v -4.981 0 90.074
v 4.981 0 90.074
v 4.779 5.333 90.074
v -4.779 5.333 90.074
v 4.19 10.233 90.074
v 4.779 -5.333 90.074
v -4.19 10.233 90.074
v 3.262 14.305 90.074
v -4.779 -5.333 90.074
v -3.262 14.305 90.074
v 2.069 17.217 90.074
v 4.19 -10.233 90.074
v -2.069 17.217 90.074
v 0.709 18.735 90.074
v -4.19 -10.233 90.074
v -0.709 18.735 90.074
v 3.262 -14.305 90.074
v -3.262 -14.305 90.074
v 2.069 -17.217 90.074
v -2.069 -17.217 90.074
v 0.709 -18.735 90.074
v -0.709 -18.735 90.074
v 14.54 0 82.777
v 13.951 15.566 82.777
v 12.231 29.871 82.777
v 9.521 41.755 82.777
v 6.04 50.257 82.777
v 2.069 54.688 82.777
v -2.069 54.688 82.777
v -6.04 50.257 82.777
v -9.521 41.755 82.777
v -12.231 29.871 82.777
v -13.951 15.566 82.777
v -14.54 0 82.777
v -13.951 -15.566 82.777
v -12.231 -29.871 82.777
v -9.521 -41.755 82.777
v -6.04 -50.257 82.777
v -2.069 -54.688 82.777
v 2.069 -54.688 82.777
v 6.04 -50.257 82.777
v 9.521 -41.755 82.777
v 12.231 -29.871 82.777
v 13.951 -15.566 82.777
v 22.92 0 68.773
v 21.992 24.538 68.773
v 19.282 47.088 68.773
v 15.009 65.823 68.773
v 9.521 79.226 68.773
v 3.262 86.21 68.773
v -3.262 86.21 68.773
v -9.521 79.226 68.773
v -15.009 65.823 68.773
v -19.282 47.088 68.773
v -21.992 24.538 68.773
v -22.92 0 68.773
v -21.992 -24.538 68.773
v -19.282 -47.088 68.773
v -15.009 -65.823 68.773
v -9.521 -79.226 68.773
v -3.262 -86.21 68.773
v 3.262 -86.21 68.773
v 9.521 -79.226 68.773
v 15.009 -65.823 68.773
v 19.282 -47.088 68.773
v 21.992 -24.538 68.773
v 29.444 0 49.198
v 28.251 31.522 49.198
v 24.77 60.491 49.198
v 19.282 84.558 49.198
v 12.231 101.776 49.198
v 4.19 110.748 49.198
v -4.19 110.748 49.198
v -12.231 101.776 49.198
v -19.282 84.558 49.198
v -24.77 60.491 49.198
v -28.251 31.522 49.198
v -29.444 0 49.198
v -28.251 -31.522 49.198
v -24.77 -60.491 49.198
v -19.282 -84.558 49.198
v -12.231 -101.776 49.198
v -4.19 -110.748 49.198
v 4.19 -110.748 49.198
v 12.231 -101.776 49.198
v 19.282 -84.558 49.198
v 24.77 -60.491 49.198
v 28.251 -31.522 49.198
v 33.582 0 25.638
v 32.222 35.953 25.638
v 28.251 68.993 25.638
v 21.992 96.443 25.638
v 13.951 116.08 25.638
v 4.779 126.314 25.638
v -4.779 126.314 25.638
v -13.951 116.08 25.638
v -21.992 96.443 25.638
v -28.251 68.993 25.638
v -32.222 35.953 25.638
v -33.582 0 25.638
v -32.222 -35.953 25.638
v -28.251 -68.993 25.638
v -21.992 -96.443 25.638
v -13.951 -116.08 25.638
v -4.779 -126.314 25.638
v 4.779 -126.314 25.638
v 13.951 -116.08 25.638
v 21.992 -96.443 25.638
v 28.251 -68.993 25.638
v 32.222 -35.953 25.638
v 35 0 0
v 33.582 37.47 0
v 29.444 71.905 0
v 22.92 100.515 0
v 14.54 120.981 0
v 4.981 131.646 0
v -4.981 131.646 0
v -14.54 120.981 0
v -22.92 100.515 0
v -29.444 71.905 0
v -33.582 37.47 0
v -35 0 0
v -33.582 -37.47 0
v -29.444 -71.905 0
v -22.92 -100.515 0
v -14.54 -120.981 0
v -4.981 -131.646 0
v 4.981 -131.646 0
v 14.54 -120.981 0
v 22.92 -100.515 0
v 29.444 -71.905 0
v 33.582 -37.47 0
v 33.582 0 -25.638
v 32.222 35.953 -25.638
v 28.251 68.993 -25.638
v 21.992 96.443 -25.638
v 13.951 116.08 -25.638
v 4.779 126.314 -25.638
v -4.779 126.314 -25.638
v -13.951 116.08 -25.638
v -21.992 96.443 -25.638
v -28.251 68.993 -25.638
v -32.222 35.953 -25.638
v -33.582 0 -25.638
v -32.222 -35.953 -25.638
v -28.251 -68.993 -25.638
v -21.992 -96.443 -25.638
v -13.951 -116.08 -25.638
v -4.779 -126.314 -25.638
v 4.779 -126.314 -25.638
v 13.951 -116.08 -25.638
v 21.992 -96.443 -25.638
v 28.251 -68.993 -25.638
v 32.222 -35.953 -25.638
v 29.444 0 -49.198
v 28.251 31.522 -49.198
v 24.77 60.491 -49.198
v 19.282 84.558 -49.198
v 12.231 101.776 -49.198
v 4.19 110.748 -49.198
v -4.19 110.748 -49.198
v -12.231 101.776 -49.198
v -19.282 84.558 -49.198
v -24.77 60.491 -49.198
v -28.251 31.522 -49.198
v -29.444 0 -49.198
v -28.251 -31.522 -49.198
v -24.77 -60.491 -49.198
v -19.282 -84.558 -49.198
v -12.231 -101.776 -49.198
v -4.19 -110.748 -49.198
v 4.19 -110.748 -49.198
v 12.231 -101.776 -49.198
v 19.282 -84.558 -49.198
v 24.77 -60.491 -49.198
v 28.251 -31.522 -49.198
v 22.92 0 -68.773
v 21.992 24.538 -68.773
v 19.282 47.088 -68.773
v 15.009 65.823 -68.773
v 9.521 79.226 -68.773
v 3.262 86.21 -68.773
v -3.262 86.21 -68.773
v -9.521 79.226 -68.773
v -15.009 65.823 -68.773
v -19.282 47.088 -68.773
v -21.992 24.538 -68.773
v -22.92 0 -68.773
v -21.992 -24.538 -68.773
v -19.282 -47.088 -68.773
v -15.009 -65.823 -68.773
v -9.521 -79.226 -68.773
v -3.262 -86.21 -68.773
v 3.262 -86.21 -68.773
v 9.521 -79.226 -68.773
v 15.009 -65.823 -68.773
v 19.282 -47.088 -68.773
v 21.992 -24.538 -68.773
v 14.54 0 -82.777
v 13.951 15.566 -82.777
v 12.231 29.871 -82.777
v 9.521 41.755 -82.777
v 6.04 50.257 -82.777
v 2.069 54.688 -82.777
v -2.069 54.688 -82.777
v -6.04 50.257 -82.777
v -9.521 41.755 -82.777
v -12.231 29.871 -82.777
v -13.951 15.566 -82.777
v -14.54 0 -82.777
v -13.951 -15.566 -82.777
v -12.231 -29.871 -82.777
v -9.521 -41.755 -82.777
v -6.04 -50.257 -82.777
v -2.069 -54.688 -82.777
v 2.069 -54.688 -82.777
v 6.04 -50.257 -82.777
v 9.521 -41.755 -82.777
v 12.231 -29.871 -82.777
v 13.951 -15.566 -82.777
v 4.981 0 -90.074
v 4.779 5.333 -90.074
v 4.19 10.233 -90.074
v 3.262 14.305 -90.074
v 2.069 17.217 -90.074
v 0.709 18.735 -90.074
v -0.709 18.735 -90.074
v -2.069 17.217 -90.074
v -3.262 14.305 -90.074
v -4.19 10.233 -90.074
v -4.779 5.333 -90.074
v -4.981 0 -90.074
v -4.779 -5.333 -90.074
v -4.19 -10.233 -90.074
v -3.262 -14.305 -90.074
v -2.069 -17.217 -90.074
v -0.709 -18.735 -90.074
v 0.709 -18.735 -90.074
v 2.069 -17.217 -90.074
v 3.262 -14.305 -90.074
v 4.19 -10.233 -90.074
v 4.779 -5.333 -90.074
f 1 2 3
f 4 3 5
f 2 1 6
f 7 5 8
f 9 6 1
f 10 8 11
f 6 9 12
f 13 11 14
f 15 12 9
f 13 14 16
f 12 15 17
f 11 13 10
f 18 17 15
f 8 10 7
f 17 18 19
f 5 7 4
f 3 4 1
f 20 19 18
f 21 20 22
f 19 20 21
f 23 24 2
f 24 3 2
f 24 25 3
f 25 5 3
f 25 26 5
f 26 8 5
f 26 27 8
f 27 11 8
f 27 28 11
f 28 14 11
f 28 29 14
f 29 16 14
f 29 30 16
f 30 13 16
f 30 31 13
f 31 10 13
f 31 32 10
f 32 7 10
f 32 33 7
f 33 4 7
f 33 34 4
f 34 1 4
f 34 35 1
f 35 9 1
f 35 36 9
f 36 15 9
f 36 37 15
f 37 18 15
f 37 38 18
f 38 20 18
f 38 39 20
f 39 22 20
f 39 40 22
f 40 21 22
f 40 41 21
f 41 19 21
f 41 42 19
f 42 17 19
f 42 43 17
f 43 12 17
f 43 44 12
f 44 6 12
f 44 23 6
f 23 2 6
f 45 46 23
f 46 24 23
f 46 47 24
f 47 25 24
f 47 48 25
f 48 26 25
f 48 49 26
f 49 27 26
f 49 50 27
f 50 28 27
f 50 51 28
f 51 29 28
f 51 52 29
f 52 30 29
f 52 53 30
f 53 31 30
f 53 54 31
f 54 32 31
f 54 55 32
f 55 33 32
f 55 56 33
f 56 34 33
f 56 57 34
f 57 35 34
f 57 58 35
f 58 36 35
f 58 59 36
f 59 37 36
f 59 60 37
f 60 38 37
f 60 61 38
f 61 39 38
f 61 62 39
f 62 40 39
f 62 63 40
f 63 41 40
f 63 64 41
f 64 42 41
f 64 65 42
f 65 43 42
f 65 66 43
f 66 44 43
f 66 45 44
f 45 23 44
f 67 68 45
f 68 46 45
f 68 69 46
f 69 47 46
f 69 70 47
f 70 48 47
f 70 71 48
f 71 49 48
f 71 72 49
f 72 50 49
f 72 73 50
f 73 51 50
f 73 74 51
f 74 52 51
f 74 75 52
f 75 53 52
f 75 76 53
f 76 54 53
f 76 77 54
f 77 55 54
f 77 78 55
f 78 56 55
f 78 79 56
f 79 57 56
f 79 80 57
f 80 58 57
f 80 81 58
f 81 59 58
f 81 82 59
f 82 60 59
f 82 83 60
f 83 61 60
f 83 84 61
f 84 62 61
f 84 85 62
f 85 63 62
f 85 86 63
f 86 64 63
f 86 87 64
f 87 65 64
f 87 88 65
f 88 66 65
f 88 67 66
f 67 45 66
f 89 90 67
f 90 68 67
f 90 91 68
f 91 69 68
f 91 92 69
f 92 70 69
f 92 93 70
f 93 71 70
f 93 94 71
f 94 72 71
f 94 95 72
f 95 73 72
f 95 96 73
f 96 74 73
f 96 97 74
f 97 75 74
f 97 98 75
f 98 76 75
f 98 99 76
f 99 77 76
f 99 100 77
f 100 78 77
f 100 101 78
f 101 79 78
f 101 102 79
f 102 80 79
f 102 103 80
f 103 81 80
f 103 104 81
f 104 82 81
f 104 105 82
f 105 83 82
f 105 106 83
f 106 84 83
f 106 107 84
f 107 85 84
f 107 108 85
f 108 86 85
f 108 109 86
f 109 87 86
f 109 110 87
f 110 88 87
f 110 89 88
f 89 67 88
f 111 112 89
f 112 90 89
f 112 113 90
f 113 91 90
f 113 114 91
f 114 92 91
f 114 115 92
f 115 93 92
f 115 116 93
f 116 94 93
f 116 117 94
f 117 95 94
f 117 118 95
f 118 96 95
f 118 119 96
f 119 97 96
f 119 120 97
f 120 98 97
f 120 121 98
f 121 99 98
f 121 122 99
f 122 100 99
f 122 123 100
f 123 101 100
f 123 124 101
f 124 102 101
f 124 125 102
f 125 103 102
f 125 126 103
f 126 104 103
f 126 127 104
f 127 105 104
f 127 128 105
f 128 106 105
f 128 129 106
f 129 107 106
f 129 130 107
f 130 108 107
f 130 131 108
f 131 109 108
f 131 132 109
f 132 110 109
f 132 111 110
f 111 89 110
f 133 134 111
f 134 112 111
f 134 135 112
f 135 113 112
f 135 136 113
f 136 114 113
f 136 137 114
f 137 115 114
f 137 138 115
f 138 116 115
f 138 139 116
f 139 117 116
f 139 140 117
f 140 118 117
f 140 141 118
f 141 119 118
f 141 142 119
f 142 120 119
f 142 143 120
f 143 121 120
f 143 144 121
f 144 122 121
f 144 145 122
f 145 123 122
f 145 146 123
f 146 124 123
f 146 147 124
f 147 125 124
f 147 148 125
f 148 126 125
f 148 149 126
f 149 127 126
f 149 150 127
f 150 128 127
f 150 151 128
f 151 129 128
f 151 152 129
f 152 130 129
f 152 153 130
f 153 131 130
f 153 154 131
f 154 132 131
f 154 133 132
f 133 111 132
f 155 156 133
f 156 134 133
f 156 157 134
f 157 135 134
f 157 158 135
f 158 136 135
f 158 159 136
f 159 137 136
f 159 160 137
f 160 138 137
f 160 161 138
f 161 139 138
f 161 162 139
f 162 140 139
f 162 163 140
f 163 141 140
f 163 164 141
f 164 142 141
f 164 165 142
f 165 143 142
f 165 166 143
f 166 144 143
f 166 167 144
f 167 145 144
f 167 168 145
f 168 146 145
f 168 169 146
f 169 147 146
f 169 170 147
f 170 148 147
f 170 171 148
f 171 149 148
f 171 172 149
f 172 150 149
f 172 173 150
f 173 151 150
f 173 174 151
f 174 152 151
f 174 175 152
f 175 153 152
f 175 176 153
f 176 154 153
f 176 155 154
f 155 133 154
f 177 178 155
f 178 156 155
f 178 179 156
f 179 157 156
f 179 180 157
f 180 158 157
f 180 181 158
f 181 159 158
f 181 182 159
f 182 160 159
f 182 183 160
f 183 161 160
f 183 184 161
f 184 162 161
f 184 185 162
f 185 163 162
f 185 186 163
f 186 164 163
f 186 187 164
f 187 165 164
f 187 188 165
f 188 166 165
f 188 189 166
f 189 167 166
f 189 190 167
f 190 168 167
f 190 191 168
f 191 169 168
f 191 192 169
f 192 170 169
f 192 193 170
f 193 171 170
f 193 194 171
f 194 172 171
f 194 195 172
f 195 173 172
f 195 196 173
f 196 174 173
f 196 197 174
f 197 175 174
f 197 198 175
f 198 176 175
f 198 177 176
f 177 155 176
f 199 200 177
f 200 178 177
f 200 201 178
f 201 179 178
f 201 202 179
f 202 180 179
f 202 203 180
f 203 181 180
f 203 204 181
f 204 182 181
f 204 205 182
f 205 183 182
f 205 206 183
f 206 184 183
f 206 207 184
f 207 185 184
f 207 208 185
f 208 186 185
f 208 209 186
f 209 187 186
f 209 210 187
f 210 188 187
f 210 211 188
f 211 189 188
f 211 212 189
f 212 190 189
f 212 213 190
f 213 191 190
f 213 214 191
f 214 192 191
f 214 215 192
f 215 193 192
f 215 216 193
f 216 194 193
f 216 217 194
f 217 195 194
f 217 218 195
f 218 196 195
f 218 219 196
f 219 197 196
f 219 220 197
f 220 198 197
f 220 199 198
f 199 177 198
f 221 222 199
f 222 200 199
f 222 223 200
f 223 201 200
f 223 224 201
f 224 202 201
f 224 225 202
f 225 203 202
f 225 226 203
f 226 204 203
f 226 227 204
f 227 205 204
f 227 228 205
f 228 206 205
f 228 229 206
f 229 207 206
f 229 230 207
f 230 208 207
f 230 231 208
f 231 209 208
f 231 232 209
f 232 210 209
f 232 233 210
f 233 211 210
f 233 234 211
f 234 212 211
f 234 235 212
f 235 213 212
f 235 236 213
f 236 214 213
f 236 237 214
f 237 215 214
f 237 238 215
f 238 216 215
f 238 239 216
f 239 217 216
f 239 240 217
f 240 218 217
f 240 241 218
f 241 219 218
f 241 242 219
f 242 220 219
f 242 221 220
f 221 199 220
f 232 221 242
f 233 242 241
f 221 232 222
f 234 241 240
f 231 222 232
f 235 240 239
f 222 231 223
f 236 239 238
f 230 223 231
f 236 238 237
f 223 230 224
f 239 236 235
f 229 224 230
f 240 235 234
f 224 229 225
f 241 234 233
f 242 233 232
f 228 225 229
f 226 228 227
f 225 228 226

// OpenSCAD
// Generated by SolidPython 1.0.1 on 2020-07-29 00:46:47


scale(v = [5, 19, 13]) {
	sphere(r = 7);
}
/***********************************************
*********      SolidPython code:      **********
************************************************
 
# import packages: SolidPython
from solid import *
from solid.utils import *
from itertools import chain, combinations, permutations


class Resize:

    def __init__(self, scad_file):
        self.scad_file = scad_file
        #self.scad_file = import_scad(scad_file)
        # cone/cylinder param:
        self.r1 = 0
        self.r2 = 0
        self.h = 0
        # rectangular prism param:
        self.w = 0
        self.l = 0
        # ellipse param:
        self.r = 0

    # import OpenScad code (file name corresponds to shape)


    # classify shape + parameters
    def assign(self, param1, param2, param3):
        if self.scad_file == 'cone.scad':
            self.r1 = param1
            self.r2 = param2
            self.h = param3
        elif self.scad_file == 'cylinder.scad':
            self.r1 = param1
            self.r2 = param2
            self.h = param3
        elif self.scad_file == 'rectangularPrism.scad':
            self.h = param1
            self.l = param2
            self.w = param3
        else:
            self.r = param1
            self.h = param2

    # resize parameters
    def iterate(self):
        x = range(3, 20, 2)
        i = 1
        if self.scad_file == 'cone.scad':
            tempList = list(permutations(x, 2))
            for temp in tempList:
                param1 = temp[0]
                param2 = temp[1]
                filepath = 'produced_scad_files/' + 'cone' + str(param1) + '_' + str(param2) + '_' + '.scad'
                scad_render_to_file(cylinder(h=param1, r1=param2, r2=0), filepath)

        elif self.scad_file == 'cylinder.scad':
            tempList = list(permutations(x, 3))
            for temp in tempList:
                param1 = temp[0]
                param2 = temp[1]
                filepath = 'produced_scad_files/' + 'cylinder' + str(param1) + '_' + str(param2) + '_' + '.scad'
                scad_render_to_file(cylinder(h=param1, r1=param2, r2=param2), filepath)

        elif self.scad_file == 'rectangularPrism.scad':
            tempList = list(permutations(x, 3))
            for temp in tempList:
                param1 = temp[0]
                param2 = temp[1]
                param3 = temp[2]
                filepath = 'produced_scad_files/' + 'rectangularPrism' + str(param1) + '_' + str(param2) + '_' + str(
                    param3) + '.scad'
                scad_render_to_file(cube(size=(param1, param2, param3)), filepath)

        elif self.scad_file == 'ellipse.scad':
            tempList = list(permutations(x, 4))
            for temp in tempList:
                param1 = temp[0]
                param2 = temp[1]
                param3 = temp[2]
                param4 = temp[3]
                filepath = 'produced_scad_files/' + 'ellipse' + str(param1) + '_' + str(param2) + '_' + str(param3) + '_' + str(param4) + '.scad'
                scad_render_to_file(scale([param1, param2, param3])(sphere(r=param4)), filepath)

    def render_to_scadfile(self):
        scad_render_to_file(scad, 'example.scad') 
 
************************************************/
